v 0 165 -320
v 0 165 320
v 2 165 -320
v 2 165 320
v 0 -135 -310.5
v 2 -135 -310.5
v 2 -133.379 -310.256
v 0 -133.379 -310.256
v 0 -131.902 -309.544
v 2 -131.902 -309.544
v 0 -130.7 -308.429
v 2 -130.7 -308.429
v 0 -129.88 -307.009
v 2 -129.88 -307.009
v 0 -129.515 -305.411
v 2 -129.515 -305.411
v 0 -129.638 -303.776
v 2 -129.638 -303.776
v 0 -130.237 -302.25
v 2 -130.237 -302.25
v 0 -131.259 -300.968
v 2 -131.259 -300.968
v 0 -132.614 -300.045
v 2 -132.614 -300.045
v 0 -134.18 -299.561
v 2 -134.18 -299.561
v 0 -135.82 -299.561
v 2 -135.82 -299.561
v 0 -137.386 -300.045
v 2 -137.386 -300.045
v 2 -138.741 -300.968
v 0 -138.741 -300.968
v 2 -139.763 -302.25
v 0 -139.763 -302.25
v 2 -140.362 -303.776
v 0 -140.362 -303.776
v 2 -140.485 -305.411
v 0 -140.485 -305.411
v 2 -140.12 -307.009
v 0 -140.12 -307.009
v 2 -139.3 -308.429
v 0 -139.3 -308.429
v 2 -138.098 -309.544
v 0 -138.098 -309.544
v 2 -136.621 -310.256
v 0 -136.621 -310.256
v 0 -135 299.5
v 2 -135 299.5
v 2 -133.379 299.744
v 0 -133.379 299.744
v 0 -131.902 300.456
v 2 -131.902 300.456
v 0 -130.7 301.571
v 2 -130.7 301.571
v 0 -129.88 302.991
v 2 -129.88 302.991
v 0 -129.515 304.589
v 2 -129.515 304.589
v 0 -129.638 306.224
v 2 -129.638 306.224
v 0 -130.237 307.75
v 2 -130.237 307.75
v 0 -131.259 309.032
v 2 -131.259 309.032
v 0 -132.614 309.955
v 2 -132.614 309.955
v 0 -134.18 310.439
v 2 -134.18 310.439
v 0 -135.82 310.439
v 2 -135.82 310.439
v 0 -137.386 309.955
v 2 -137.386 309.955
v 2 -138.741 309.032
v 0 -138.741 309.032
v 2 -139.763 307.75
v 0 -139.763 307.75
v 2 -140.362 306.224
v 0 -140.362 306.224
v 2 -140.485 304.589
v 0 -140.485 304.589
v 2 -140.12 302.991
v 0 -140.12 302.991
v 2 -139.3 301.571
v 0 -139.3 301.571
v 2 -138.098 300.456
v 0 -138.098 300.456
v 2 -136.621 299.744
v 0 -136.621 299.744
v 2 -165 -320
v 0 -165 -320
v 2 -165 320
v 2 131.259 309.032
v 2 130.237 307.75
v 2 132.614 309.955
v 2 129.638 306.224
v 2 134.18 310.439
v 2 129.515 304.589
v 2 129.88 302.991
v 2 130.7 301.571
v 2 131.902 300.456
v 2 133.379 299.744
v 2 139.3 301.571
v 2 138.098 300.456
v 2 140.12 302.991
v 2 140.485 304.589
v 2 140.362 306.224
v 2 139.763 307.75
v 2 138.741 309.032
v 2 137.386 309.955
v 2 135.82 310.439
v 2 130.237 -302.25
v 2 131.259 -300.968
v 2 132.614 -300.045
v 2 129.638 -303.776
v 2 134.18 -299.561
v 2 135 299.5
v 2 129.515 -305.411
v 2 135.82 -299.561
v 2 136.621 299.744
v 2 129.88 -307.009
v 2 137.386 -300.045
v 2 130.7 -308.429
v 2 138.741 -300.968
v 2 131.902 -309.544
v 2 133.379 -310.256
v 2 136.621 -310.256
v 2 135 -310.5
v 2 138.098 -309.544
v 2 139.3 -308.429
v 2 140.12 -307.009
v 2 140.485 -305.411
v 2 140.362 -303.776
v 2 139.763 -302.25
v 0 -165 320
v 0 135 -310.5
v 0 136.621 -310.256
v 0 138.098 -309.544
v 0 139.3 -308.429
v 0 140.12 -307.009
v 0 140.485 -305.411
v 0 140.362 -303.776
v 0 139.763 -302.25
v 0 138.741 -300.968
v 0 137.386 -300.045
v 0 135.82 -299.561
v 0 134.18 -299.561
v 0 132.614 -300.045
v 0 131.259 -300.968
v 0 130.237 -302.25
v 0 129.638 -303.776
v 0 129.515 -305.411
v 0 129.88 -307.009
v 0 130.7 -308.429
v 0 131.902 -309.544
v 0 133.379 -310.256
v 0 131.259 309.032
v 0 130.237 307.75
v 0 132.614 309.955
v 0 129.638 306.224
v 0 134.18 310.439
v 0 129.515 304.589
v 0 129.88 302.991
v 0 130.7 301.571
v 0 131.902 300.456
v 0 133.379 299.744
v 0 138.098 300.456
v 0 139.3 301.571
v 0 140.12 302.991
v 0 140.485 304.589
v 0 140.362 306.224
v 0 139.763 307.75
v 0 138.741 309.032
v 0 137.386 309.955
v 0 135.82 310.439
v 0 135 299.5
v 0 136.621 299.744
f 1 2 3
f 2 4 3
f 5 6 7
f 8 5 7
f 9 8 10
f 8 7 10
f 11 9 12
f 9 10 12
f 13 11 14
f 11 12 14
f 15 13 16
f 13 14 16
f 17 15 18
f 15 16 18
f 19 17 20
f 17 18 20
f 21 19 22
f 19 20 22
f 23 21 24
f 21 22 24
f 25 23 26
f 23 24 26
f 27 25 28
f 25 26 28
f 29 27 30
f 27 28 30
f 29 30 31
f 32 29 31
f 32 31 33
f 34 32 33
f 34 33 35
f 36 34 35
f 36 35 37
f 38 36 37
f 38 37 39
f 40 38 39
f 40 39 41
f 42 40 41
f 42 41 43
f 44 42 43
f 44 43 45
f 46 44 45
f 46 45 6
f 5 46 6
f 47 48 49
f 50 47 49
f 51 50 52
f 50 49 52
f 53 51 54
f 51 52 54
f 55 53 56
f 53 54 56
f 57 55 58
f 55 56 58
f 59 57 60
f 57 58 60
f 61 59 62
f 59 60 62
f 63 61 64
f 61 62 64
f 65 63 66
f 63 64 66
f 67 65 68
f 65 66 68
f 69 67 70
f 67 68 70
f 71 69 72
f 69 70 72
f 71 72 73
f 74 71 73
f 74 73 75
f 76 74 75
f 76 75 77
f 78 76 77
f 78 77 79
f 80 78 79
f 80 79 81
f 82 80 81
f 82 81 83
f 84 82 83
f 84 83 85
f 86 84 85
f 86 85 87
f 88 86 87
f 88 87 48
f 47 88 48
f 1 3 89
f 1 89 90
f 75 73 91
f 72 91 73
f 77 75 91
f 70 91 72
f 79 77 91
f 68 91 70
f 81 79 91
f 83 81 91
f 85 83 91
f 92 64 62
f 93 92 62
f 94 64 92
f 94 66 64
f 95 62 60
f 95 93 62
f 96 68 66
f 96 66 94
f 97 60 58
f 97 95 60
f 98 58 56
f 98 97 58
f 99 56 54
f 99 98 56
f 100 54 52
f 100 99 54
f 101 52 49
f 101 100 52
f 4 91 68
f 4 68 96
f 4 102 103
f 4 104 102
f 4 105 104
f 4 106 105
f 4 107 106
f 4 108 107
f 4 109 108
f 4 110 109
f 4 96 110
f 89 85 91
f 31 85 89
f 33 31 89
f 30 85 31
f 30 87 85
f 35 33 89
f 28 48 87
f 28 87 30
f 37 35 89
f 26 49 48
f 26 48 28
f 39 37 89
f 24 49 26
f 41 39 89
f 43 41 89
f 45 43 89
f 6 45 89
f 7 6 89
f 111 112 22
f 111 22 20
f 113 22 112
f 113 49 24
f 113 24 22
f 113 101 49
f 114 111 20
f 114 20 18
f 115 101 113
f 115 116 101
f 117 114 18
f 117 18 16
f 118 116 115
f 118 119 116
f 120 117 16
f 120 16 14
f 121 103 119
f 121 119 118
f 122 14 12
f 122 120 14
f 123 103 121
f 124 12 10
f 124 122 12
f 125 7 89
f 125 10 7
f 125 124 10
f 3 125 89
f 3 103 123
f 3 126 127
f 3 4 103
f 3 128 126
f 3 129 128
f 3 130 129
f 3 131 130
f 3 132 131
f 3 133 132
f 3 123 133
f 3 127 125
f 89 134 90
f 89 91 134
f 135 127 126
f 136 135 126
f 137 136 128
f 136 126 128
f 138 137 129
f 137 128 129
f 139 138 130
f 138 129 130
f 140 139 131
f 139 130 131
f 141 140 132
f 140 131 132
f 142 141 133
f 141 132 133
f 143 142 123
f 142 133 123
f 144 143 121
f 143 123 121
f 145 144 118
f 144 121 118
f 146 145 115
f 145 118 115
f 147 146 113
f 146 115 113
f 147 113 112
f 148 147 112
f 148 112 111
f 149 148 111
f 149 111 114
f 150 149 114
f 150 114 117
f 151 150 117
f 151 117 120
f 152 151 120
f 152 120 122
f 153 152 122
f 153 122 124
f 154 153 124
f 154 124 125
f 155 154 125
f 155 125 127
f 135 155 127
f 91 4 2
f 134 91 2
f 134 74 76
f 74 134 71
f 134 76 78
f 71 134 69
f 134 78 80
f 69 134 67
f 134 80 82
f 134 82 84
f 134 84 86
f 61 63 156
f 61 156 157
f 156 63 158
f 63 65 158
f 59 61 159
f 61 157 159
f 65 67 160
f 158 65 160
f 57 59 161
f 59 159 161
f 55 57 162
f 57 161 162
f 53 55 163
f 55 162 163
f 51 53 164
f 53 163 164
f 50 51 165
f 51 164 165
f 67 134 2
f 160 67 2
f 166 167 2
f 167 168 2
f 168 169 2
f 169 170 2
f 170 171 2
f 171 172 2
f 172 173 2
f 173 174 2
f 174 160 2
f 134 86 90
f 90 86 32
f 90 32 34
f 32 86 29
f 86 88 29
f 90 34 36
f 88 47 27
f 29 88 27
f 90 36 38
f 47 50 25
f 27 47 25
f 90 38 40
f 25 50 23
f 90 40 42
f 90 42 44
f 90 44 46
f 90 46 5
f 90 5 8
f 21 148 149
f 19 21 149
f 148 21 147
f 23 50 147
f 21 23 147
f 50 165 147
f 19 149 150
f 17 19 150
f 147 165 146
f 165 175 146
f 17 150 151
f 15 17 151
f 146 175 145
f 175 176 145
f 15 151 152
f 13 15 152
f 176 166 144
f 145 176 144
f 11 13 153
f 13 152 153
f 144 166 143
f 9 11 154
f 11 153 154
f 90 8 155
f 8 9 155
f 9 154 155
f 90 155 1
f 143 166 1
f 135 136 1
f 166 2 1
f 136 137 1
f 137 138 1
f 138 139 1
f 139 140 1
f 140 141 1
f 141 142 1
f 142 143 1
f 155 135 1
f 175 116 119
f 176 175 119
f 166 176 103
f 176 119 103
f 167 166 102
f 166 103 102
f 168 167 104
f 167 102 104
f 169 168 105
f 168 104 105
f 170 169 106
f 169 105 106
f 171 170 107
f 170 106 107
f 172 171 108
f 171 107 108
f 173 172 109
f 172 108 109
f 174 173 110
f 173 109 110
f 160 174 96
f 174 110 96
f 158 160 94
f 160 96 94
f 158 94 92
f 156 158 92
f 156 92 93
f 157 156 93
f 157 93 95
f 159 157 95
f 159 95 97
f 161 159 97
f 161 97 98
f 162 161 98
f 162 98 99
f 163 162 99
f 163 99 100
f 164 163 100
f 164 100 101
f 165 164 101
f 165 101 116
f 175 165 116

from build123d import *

# Parameters (mm, degrees)
SKETCH1_W   = 640
SKETCH1_H   = 330
SKETCH1_R   = 5.5
THICKEN1_T1 = 2


with BuildPart() as body_1:
    # Sketch1 → Surface-Plane1: a flat surface bounded by the sketch
    with BuildSketch(Plane(origin=(0, 0, 0), x_dir=(0, 0, -1), z_dir=(1, 0, 0)), mode=Mode.PRIVATE) as surface_plane1_1_region:
        Rectangle(SKETCH1_W, SKETCH1_H)
        with Locations((-305, 135)):
            Circle(SKETCH1_R, mode=Mode.SUBTRACT)
        with Locations((305, 135)):
            Circle(SKETCH1_R, mode=Mode.SUBTRACT)
        with Locations((305, -135)):
            Circle(SKETCH1_R, mode=Mode.SUBTRACT)
        with Locations((-305, -135)):
            Circle(SKETCH1_R, mode=Mode.SUBTRACT)
    surface_plane1_1 = surface_plane1_1_region.sketch.faces()[0]
    add(Solid.thicken(surface_plane1_1, THICKEN1_T1))


solid = body_1.part
